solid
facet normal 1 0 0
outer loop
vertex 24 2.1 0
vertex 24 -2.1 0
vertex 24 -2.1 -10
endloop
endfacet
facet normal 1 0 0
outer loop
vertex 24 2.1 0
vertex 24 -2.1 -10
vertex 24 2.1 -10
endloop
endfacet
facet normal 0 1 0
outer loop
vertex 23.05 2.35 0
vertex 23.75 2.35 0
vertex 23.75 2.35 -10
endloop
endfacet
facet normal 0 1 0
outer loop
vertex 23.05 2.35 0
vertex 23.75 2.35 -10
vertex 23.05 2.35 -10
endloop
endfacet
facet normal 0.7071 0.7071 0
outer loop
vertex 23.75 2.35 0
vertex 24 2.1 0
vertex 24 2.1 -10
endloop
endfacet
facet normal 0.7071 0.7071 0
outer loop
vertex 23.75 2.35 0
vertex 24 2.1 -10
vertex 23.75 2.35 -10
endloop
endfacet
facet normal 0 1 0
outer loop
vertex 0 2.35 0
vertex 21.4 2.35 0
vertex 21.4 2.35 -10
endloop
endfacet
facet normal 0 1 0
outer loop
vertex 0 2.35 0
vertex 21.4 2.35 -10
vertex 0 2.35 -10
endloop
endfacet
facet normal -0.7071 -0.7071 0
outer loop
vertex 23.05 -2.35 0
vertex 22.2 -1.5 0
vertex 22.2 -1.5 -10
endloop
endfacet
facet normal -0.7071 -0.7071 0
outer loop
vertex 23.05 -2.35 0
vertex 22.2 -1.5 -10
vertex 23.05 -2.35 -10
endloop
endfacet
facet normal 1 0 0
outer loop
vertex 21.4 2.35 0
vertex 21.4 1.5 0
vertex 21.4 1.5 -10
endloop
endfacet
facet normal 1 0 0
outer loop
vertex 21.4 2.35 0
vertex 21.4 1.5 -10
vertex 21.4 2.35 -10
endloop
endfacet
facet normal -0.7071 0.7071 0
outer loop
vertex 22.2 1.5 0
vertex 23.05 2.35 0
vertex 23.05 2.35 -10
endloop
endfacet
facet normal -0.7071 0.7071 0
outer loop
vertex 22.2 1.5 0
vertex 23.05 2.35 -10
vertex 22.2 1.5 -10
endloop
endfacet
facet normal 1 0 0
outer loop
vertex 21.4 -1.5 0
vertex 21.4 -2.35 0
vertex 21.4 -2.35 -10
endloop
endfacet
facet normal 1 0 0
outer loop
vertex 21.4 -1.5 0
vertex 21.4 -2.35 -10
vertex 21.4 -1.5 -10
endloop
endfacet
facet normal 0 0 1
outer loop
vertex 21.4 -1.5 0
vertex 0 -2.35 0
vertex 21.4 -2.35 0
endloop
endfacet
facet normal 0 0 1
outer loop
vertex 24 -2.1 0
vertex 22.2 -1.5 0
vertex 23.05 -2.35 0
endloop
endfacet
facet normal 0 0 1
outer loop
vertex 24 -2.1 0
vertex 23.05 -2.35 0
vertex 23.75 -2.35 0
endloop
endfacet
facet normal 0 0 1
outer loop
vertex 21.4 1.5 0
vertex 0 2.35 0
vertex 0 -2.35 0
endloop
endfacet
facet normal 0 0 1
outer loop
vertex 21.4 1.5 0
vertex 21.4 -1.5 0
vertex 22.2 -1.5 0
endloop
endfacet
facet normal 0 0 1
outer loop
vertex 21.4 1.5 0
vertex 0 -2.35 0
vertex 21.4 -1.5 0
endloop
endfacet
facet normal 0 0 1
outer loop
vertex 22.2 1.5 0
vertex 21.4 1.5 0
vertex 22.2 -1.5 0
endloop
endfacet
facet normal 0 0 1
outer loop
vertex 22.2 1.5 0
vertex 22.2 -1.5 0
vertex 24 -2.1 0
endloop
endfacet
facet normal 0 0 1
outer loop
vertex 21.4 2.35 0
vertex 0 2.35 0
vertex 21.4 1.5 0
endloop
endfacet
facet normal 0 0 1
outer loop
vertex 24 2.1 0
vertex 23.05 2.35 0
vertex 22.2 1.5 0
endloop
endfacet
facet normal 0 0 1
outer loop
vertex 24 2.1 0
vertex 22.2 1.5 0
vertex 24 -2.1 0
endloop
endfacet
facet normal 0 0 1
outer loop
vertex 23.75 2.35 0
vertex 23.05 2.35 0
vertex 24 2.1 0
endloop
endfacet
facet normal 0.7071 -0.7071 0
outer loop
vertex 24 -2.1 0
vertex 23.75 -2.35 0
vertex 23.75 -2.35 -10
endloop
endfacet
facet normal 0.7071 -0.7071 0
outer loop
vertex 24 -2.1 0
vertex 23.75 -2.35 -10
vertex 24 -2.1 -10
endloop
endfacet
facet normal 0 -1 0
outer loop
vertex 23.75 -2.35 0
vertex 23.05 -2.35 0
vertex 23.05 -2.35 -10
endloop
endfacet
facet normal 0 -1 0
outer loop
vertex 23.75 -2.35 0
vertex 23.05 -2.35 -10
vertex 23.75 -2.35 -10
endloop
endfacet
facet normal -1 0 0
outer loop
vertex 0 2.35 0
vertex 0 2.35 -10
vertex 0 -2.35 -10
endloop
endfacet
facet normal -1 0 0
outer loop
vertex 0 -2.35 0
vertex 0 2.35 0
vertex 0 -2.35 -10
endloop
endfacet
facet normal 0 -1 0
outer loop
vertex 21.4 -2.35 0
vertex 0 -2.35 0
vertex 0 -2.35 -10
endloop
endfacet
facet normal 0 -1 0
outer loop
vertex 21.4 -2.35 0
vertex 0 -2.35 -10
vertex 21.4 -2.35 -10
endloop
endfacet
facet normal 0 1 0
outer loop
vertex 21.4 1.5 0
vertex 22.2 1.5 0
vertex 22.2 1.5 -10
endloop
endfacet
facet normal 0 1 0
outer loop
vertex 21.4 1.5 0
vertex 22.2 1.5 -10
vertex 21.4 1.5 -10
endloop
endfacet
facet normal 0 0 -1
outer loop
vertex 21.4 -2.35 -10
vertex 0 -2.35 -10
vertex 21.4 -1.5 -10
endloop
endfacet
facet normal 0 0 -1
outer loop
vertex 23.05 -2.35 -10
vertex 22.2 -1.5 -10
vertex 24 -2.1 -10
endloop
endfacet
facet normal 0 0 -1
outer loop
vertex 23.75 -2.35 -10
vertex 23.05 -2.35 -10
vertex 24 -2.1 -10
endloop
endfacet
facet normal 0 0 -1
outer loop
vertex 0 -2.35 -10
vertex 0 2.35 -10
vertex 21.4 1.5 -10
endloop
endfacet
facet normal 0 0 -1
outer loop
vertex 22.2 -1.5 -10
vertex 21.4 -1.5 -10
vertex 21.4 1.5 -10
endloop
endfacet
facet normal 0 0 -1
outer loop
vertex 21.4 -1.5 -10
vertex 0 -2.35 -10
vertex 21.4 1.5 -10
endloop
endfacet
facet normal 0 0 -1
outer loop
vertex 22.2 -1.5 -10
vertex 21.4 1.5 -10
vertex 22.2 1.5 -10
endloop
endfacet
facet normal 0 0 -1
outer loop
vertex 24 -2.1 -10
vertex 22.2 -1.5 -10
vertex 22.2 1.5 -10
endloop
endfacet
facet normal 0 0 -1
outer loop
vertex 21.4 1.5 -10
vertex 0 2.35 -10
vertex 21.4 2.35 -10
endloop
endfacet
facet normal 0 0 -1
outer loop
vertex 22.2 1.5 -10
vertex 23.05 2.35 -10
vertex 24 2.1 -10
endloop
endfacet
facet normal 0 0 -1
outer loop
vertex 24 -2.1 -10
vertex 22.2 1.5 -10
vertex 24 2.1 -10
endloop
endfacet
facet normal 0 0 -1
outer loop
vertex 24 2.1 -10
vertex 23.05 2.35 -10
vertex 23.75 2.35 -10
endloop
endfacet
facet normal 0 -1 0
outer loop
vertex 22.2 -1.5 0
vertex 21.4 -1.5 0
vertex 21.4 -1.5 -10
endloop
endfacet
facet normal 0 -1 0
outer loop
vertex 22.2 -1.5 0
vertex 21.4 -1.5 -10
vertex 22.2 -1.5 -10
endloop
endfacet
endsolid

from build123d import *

# Parameters (mm, degrees)
F1_DEPTH = 10


with BuildPart() as f1:
    # F0 (on Top) → F1 (new body)
    with BuildSketch(Plane.XY):
        Polygon((22.2, 1.5), (21.4, 1.5), (21.4, 2.35), (0, 2.35), (0, 0), (0, -2.35), (21.4, -2.35), (21.4, -1.5), (22.2, -1.5), (23.05, -2.35), (23.75, -2.35), (24, -2.1), (24, 0), (24, 2.1), (23.75, 2.35), (23.05, 2.35), align=None)
    extrude(amount=-F1_DEPTH)


solid = f1.part
